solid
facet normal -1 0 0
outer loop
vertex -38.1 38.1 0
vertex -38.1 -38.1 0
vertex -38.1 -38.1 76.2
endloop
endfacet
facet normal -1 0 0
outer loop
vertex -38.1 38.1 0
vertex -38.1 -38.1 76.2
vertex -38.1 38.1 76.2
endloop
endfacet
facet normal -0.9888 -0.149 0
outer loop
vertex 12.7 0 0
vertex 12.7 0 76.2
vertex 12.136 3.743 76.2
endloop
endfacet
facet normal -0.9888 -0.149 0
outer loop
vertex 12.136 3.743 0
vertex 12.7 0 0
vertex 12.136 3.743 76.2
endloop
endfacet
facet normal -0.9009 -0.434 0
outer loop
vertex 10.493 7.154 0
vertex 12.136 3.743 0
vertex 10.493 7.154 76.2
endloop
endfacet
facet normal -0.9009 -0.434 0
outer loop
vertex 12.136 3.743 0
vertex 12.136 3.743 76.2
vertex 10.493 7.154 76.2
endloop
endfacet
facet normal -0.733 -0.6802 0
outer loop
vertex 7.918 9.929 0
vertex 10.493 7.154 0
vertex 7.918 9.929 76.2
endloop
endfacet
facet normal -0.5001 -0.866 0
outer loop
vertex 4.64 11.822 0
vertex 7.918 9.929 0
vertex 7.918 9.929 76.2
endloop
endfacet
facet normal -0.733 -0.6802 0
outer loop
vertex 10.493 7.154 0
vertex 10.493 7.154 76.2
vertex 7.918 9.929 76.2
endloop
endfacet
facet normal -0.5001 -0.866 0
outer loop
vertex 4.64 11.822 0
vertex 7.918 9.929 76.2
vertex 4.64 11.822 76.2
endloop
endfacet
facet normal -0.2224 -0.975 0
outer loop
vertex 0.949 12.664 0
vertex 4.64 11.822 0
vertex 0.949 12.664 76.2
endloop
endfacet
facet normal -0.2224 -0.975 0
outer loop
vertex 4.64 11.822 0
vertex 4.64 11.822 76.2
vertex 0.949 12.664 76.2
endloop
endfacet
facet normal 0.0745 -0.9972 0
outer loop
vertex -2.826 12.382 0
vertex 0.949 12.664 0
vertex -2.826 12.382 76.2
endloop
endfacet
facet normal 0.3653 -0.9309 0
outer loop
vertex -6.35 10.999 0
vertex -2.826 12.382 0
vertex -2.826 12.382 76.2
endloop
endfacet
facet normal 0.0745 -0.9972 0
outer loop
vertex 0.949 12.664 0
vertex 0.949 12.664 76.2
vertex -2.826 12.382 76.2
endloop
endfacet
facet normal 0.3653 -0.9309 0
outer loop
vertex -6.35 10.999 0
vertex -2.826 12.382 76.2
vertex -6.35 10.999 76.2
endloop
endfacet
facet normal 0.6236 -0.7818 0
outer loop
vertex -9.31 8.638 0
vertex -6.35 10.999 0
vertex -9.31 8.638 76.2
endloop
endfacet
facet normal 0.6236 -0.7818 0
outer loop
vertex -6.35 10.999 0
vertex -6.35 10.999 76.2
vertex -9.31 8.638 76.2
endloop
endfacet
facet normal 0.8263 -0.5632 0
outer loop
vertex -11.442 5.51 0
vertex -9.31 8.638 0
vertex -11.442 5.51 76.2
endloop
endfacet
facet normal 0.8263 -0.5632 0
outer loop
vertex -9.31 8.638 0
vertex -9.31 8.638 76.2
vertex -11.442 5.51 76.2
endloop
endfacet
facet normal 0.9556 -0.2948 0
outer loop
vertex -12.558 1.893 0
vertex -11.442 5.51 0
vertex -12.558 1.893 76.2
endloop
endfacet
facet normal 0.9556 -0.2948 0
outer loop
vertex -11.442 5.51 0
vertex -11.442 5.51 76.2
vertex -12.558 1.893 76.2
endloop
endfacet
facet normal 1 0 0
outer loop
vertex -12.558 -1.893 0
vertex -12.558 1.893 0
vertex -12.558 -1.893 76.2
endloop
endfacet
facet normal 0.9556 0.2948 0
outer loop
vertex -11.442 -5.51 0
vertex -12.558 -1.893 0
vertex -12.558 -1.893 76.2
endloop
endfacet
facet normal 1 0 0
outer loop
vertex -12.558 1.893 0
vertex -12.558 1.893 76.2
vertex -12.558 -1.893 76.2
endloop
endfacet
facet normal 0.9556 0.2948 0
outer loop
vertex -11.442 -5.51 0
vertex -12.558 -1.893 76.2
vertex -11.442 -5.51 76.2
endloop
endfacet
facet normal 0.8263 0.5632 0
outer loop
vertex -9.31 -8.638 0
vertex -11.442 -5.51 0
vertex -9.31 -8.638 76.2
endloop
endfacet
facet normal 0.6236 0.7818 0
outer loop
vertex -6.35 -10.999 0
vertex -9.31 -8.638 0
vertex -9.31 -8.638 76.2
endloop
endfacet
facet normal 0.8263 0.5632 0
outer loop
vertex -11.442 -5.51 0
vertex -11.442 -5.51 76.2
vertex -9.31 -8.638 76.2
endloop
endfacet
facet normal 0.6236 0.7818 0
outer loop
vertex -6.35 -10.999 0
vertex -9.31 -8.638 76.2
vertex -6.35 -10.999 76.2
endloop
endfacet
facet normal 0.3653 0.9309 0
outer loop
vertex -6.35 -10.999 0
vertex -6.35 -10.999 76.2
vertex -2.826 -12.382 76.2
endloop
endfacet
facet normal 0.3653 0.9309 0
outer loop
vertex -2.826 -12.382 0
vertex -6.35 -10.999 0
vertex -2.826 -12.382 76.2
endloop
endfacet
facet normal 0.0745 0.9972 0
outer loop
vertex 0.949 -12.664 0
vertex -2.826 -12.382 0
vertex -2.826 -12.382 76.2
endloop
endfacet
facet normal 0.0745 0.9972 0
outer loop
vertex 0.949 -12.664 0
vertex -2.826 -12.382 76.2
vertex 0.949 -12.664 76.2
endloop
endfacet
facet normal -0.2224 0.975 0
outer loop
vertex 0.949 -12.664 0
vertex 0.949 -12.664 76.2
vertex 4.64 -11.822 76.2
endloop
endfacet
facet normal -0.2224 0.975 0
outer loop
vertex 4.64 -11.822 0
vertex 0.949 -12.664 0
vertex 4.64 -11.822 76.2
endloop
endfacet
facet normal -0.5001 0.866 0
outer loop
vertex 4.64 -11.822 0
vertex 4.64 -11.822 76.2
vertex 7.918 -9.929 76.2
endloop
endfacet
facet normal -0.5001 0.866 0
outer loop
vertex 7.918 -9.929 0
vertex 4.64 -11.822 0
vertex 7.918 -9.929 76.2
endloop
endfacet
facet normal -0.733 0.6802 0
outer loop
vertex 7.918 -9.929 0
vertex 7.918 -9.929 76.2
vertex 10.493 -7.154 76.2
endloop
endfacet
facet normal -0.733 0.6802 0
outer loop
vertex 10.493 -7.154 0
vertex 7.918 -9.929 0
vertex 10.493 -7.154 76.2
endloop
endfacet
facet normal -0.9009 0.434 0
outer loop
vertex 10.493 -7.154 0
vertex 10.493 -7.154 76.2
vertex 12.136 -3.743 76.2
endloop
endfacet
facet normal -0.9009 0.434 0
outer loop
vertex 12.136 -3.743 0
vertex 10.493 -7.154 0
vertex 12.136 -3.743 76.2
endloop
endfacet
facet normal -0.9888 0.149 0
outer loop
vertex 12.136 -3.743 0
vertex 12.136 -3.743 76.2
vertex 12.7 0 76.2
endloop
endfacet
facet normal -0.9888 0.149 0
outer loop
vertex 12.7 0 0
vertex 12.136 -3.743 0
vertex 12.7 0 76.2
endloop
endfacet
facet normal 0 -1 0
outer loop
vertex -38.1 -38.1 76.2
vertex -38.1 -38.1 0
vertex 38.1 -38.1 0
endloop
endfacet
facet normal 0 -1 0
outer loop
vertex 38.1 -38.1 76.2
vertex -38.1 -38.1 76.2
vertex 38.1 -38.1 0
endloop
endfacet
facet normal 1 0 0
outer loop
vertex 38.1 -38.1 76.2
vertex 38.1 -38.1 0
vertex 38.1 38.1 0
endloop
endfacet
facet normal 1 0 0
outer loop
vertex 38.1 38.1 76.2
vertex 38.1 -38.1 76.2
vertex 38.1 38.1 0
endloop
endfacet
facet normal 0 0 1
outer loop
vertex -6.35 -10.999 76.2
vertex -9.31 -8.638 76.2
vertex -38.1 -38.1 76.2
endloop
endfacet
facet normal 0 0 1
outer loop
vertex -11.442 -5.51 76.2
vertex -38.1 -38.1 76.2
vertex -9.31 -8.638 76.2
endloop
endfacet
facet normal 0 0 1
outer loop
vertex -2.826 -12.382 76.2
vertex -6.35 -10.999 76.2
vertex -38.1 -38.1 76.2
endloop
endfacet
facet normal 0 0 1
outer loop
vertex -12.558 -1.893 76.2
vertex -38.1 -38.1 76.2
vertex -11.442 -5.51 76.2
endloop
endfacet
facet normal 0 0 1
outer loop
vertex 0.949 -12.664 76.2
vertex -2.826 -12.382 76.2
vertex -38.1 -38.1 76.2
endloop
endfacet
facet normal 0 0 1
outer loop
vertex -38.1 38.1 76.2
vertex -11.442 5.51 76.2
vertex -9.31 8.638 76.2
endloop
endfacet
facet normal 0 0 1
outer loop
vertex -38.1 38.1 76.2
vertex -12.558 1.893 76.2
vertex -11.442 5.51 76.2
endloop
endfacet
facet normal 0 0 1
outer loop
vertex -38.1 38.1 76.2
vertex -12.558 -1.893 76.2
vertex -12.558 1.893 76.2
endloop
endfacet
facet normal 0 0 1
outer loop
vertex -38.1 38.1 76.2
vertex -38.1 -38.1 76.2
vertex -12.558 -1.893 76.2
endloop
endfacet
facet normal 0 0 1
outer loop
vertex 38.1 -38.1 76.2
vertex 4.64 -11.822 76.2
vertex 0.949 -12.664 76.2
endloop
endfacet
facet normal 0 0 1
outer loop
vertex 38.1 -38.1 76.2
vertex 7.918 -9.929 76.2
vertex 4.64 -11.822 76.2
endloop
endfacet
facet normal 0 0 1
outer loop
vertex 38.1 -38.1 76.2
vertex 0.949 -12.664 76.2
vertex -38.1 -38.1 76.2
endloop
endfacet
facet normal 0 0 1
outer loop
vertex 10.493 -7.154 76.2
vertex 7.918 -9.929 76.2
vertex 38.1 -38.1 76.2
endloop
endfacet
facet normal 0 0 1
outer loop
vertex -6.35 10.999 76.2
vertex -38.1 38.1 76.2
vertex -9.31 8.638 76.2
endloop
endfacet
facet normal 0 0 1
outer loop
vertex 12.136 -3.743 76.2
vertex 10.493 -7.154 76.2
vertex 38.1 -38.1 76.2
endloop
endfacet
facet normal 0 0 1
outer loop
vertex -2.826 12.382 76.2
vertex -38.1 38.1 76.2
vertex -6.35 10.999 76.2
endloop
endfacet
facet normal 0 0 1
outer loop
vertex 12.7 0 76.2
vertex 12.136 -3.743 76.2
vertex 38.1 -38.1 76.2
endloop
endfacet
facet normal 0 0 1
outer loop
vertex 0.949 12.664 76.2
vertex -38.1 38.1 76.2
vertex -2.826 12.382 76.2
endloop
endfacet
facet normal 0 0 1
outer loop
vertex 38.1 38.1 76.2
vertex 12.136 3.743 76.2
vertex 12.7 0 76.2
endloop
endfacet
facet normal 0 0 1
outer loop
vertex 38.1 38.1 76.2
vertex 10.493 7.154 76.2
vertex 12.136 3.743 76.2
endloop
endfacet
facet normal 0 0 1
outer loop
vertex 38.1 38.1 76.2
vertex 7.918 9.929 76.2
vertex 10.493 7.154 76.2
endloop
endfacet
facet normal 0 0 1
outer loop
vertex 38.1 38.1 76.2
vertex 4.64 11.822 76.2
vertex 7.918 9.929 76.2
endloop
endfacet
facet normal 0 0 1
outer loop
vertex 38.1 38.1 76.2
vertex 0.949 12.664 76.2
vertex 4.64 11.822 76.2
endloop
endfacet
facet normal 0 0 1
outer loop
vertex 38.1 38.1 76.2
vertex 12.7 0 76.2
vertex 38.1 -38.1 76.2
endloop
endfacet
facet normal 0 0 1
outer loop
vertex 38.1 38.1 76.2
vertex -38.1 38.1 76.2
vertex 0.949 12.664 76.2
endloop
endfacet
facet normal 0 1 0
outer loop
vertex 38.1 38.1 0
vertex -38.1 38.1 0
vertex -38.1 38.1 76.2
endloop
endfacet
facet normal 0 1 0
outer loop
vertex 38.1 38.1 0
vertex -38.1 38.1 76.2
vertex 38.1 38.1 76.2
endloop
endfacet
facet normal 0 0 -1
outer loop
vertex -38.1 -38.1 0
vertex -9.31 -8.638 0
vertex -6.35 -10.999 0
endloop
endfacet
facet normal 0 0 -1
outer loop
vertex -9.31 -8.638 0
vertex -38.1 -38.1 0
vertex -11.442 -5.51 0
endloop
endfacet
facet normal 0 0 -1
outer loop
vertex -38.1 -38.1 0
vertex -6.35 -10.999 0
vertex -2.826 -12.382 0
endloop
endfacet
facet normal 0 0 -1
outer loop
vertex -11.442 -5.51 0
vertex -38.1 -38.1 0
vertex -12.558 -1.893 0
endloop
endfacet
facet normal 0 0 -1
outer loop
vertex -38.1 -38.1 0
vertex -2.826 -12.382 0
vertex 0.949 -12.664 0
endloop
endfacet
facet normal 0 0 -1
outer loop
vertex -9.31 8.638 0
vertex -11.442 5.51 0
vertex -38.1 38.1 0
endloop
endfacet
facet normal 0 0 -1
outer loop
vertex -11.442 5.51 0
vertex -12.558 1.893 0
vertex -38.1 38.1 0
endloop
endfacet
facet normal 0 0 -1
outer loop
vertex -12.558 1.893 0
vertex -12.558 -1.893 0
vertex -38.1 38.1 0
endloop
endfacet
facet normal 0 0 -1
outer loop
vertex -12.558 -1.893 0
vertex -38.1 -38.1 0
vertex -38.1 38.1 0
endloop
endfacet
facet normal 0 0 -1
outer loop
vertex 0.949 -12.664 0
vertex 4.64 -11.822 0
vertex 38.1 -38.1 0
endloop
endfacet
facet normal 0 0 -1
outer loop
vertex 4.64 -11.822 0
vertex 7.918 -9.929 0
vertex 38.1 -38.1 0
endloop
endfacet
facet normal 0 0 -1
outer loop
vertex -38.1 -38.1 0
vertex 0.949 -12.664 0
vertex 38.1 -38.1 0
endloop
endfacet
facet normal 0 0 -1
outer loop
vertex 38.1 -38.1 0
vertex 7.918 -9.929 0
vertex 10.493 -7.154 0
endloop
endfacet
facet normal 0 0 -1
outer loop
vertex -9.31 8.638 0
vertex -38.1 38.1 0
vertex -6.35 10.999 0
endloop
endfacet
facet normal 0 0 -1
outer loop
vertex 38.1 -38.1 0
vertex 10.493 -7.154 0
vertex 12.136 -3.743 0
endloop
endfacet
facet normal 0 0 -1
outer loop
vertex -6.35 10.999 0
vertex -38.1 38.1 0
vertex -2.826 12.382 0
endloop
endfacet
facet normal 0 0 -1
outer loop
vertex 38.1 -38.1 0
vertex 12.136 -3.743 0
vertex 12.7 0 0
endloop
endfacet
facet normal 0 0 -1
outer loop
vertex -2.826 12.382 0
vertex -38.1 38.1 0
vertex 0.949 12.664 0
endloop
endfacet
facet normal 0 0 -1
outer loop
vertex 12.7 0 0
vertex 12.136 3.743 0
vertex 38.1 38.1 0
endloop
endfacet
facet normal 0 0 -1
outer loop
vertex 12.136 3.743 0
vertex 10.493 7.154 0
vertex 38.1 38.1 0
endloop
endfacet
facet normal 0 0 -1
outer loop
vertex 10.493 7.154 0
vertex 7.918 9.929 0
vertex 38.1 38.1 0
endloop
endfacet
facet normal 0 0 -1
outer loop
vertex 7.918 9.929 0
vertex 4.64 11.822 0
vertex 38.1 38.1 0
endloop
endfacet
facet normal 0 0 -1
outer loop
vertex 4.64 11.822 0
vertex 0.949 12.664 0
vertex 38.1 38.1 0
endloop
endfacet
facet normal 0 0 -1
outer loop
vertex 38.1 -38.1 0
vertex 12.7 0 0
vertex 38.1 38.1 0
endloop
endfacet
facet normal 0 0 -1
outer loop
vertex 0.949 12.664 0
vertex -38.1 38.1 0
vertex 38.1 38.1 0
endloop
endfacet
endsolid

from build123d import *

# Parameters (mm, degrees)
F1_W     = 76.2
F1_H     = 76.2
F2_DEPTH = 76.2
F3_R     = 12.7
F4_DEPTH = 76.201


with BuildPart() as f2:
    # F1 (on face) → F2 (new body)
    with BuildSketch(Plane.XY):
        Rectangle(F1_W, F1_H)
    extrude(amount=F2_DEPTH)

    # F3 (on face) → F4 (cut, through all)
    with BuildSketch(Plane.XY.offset(76.2)):
        Circle(F3_R)
    extrude(amount=-F4_DEPTH, mode=Mode.SUBTRACT)


solid = f2.part
